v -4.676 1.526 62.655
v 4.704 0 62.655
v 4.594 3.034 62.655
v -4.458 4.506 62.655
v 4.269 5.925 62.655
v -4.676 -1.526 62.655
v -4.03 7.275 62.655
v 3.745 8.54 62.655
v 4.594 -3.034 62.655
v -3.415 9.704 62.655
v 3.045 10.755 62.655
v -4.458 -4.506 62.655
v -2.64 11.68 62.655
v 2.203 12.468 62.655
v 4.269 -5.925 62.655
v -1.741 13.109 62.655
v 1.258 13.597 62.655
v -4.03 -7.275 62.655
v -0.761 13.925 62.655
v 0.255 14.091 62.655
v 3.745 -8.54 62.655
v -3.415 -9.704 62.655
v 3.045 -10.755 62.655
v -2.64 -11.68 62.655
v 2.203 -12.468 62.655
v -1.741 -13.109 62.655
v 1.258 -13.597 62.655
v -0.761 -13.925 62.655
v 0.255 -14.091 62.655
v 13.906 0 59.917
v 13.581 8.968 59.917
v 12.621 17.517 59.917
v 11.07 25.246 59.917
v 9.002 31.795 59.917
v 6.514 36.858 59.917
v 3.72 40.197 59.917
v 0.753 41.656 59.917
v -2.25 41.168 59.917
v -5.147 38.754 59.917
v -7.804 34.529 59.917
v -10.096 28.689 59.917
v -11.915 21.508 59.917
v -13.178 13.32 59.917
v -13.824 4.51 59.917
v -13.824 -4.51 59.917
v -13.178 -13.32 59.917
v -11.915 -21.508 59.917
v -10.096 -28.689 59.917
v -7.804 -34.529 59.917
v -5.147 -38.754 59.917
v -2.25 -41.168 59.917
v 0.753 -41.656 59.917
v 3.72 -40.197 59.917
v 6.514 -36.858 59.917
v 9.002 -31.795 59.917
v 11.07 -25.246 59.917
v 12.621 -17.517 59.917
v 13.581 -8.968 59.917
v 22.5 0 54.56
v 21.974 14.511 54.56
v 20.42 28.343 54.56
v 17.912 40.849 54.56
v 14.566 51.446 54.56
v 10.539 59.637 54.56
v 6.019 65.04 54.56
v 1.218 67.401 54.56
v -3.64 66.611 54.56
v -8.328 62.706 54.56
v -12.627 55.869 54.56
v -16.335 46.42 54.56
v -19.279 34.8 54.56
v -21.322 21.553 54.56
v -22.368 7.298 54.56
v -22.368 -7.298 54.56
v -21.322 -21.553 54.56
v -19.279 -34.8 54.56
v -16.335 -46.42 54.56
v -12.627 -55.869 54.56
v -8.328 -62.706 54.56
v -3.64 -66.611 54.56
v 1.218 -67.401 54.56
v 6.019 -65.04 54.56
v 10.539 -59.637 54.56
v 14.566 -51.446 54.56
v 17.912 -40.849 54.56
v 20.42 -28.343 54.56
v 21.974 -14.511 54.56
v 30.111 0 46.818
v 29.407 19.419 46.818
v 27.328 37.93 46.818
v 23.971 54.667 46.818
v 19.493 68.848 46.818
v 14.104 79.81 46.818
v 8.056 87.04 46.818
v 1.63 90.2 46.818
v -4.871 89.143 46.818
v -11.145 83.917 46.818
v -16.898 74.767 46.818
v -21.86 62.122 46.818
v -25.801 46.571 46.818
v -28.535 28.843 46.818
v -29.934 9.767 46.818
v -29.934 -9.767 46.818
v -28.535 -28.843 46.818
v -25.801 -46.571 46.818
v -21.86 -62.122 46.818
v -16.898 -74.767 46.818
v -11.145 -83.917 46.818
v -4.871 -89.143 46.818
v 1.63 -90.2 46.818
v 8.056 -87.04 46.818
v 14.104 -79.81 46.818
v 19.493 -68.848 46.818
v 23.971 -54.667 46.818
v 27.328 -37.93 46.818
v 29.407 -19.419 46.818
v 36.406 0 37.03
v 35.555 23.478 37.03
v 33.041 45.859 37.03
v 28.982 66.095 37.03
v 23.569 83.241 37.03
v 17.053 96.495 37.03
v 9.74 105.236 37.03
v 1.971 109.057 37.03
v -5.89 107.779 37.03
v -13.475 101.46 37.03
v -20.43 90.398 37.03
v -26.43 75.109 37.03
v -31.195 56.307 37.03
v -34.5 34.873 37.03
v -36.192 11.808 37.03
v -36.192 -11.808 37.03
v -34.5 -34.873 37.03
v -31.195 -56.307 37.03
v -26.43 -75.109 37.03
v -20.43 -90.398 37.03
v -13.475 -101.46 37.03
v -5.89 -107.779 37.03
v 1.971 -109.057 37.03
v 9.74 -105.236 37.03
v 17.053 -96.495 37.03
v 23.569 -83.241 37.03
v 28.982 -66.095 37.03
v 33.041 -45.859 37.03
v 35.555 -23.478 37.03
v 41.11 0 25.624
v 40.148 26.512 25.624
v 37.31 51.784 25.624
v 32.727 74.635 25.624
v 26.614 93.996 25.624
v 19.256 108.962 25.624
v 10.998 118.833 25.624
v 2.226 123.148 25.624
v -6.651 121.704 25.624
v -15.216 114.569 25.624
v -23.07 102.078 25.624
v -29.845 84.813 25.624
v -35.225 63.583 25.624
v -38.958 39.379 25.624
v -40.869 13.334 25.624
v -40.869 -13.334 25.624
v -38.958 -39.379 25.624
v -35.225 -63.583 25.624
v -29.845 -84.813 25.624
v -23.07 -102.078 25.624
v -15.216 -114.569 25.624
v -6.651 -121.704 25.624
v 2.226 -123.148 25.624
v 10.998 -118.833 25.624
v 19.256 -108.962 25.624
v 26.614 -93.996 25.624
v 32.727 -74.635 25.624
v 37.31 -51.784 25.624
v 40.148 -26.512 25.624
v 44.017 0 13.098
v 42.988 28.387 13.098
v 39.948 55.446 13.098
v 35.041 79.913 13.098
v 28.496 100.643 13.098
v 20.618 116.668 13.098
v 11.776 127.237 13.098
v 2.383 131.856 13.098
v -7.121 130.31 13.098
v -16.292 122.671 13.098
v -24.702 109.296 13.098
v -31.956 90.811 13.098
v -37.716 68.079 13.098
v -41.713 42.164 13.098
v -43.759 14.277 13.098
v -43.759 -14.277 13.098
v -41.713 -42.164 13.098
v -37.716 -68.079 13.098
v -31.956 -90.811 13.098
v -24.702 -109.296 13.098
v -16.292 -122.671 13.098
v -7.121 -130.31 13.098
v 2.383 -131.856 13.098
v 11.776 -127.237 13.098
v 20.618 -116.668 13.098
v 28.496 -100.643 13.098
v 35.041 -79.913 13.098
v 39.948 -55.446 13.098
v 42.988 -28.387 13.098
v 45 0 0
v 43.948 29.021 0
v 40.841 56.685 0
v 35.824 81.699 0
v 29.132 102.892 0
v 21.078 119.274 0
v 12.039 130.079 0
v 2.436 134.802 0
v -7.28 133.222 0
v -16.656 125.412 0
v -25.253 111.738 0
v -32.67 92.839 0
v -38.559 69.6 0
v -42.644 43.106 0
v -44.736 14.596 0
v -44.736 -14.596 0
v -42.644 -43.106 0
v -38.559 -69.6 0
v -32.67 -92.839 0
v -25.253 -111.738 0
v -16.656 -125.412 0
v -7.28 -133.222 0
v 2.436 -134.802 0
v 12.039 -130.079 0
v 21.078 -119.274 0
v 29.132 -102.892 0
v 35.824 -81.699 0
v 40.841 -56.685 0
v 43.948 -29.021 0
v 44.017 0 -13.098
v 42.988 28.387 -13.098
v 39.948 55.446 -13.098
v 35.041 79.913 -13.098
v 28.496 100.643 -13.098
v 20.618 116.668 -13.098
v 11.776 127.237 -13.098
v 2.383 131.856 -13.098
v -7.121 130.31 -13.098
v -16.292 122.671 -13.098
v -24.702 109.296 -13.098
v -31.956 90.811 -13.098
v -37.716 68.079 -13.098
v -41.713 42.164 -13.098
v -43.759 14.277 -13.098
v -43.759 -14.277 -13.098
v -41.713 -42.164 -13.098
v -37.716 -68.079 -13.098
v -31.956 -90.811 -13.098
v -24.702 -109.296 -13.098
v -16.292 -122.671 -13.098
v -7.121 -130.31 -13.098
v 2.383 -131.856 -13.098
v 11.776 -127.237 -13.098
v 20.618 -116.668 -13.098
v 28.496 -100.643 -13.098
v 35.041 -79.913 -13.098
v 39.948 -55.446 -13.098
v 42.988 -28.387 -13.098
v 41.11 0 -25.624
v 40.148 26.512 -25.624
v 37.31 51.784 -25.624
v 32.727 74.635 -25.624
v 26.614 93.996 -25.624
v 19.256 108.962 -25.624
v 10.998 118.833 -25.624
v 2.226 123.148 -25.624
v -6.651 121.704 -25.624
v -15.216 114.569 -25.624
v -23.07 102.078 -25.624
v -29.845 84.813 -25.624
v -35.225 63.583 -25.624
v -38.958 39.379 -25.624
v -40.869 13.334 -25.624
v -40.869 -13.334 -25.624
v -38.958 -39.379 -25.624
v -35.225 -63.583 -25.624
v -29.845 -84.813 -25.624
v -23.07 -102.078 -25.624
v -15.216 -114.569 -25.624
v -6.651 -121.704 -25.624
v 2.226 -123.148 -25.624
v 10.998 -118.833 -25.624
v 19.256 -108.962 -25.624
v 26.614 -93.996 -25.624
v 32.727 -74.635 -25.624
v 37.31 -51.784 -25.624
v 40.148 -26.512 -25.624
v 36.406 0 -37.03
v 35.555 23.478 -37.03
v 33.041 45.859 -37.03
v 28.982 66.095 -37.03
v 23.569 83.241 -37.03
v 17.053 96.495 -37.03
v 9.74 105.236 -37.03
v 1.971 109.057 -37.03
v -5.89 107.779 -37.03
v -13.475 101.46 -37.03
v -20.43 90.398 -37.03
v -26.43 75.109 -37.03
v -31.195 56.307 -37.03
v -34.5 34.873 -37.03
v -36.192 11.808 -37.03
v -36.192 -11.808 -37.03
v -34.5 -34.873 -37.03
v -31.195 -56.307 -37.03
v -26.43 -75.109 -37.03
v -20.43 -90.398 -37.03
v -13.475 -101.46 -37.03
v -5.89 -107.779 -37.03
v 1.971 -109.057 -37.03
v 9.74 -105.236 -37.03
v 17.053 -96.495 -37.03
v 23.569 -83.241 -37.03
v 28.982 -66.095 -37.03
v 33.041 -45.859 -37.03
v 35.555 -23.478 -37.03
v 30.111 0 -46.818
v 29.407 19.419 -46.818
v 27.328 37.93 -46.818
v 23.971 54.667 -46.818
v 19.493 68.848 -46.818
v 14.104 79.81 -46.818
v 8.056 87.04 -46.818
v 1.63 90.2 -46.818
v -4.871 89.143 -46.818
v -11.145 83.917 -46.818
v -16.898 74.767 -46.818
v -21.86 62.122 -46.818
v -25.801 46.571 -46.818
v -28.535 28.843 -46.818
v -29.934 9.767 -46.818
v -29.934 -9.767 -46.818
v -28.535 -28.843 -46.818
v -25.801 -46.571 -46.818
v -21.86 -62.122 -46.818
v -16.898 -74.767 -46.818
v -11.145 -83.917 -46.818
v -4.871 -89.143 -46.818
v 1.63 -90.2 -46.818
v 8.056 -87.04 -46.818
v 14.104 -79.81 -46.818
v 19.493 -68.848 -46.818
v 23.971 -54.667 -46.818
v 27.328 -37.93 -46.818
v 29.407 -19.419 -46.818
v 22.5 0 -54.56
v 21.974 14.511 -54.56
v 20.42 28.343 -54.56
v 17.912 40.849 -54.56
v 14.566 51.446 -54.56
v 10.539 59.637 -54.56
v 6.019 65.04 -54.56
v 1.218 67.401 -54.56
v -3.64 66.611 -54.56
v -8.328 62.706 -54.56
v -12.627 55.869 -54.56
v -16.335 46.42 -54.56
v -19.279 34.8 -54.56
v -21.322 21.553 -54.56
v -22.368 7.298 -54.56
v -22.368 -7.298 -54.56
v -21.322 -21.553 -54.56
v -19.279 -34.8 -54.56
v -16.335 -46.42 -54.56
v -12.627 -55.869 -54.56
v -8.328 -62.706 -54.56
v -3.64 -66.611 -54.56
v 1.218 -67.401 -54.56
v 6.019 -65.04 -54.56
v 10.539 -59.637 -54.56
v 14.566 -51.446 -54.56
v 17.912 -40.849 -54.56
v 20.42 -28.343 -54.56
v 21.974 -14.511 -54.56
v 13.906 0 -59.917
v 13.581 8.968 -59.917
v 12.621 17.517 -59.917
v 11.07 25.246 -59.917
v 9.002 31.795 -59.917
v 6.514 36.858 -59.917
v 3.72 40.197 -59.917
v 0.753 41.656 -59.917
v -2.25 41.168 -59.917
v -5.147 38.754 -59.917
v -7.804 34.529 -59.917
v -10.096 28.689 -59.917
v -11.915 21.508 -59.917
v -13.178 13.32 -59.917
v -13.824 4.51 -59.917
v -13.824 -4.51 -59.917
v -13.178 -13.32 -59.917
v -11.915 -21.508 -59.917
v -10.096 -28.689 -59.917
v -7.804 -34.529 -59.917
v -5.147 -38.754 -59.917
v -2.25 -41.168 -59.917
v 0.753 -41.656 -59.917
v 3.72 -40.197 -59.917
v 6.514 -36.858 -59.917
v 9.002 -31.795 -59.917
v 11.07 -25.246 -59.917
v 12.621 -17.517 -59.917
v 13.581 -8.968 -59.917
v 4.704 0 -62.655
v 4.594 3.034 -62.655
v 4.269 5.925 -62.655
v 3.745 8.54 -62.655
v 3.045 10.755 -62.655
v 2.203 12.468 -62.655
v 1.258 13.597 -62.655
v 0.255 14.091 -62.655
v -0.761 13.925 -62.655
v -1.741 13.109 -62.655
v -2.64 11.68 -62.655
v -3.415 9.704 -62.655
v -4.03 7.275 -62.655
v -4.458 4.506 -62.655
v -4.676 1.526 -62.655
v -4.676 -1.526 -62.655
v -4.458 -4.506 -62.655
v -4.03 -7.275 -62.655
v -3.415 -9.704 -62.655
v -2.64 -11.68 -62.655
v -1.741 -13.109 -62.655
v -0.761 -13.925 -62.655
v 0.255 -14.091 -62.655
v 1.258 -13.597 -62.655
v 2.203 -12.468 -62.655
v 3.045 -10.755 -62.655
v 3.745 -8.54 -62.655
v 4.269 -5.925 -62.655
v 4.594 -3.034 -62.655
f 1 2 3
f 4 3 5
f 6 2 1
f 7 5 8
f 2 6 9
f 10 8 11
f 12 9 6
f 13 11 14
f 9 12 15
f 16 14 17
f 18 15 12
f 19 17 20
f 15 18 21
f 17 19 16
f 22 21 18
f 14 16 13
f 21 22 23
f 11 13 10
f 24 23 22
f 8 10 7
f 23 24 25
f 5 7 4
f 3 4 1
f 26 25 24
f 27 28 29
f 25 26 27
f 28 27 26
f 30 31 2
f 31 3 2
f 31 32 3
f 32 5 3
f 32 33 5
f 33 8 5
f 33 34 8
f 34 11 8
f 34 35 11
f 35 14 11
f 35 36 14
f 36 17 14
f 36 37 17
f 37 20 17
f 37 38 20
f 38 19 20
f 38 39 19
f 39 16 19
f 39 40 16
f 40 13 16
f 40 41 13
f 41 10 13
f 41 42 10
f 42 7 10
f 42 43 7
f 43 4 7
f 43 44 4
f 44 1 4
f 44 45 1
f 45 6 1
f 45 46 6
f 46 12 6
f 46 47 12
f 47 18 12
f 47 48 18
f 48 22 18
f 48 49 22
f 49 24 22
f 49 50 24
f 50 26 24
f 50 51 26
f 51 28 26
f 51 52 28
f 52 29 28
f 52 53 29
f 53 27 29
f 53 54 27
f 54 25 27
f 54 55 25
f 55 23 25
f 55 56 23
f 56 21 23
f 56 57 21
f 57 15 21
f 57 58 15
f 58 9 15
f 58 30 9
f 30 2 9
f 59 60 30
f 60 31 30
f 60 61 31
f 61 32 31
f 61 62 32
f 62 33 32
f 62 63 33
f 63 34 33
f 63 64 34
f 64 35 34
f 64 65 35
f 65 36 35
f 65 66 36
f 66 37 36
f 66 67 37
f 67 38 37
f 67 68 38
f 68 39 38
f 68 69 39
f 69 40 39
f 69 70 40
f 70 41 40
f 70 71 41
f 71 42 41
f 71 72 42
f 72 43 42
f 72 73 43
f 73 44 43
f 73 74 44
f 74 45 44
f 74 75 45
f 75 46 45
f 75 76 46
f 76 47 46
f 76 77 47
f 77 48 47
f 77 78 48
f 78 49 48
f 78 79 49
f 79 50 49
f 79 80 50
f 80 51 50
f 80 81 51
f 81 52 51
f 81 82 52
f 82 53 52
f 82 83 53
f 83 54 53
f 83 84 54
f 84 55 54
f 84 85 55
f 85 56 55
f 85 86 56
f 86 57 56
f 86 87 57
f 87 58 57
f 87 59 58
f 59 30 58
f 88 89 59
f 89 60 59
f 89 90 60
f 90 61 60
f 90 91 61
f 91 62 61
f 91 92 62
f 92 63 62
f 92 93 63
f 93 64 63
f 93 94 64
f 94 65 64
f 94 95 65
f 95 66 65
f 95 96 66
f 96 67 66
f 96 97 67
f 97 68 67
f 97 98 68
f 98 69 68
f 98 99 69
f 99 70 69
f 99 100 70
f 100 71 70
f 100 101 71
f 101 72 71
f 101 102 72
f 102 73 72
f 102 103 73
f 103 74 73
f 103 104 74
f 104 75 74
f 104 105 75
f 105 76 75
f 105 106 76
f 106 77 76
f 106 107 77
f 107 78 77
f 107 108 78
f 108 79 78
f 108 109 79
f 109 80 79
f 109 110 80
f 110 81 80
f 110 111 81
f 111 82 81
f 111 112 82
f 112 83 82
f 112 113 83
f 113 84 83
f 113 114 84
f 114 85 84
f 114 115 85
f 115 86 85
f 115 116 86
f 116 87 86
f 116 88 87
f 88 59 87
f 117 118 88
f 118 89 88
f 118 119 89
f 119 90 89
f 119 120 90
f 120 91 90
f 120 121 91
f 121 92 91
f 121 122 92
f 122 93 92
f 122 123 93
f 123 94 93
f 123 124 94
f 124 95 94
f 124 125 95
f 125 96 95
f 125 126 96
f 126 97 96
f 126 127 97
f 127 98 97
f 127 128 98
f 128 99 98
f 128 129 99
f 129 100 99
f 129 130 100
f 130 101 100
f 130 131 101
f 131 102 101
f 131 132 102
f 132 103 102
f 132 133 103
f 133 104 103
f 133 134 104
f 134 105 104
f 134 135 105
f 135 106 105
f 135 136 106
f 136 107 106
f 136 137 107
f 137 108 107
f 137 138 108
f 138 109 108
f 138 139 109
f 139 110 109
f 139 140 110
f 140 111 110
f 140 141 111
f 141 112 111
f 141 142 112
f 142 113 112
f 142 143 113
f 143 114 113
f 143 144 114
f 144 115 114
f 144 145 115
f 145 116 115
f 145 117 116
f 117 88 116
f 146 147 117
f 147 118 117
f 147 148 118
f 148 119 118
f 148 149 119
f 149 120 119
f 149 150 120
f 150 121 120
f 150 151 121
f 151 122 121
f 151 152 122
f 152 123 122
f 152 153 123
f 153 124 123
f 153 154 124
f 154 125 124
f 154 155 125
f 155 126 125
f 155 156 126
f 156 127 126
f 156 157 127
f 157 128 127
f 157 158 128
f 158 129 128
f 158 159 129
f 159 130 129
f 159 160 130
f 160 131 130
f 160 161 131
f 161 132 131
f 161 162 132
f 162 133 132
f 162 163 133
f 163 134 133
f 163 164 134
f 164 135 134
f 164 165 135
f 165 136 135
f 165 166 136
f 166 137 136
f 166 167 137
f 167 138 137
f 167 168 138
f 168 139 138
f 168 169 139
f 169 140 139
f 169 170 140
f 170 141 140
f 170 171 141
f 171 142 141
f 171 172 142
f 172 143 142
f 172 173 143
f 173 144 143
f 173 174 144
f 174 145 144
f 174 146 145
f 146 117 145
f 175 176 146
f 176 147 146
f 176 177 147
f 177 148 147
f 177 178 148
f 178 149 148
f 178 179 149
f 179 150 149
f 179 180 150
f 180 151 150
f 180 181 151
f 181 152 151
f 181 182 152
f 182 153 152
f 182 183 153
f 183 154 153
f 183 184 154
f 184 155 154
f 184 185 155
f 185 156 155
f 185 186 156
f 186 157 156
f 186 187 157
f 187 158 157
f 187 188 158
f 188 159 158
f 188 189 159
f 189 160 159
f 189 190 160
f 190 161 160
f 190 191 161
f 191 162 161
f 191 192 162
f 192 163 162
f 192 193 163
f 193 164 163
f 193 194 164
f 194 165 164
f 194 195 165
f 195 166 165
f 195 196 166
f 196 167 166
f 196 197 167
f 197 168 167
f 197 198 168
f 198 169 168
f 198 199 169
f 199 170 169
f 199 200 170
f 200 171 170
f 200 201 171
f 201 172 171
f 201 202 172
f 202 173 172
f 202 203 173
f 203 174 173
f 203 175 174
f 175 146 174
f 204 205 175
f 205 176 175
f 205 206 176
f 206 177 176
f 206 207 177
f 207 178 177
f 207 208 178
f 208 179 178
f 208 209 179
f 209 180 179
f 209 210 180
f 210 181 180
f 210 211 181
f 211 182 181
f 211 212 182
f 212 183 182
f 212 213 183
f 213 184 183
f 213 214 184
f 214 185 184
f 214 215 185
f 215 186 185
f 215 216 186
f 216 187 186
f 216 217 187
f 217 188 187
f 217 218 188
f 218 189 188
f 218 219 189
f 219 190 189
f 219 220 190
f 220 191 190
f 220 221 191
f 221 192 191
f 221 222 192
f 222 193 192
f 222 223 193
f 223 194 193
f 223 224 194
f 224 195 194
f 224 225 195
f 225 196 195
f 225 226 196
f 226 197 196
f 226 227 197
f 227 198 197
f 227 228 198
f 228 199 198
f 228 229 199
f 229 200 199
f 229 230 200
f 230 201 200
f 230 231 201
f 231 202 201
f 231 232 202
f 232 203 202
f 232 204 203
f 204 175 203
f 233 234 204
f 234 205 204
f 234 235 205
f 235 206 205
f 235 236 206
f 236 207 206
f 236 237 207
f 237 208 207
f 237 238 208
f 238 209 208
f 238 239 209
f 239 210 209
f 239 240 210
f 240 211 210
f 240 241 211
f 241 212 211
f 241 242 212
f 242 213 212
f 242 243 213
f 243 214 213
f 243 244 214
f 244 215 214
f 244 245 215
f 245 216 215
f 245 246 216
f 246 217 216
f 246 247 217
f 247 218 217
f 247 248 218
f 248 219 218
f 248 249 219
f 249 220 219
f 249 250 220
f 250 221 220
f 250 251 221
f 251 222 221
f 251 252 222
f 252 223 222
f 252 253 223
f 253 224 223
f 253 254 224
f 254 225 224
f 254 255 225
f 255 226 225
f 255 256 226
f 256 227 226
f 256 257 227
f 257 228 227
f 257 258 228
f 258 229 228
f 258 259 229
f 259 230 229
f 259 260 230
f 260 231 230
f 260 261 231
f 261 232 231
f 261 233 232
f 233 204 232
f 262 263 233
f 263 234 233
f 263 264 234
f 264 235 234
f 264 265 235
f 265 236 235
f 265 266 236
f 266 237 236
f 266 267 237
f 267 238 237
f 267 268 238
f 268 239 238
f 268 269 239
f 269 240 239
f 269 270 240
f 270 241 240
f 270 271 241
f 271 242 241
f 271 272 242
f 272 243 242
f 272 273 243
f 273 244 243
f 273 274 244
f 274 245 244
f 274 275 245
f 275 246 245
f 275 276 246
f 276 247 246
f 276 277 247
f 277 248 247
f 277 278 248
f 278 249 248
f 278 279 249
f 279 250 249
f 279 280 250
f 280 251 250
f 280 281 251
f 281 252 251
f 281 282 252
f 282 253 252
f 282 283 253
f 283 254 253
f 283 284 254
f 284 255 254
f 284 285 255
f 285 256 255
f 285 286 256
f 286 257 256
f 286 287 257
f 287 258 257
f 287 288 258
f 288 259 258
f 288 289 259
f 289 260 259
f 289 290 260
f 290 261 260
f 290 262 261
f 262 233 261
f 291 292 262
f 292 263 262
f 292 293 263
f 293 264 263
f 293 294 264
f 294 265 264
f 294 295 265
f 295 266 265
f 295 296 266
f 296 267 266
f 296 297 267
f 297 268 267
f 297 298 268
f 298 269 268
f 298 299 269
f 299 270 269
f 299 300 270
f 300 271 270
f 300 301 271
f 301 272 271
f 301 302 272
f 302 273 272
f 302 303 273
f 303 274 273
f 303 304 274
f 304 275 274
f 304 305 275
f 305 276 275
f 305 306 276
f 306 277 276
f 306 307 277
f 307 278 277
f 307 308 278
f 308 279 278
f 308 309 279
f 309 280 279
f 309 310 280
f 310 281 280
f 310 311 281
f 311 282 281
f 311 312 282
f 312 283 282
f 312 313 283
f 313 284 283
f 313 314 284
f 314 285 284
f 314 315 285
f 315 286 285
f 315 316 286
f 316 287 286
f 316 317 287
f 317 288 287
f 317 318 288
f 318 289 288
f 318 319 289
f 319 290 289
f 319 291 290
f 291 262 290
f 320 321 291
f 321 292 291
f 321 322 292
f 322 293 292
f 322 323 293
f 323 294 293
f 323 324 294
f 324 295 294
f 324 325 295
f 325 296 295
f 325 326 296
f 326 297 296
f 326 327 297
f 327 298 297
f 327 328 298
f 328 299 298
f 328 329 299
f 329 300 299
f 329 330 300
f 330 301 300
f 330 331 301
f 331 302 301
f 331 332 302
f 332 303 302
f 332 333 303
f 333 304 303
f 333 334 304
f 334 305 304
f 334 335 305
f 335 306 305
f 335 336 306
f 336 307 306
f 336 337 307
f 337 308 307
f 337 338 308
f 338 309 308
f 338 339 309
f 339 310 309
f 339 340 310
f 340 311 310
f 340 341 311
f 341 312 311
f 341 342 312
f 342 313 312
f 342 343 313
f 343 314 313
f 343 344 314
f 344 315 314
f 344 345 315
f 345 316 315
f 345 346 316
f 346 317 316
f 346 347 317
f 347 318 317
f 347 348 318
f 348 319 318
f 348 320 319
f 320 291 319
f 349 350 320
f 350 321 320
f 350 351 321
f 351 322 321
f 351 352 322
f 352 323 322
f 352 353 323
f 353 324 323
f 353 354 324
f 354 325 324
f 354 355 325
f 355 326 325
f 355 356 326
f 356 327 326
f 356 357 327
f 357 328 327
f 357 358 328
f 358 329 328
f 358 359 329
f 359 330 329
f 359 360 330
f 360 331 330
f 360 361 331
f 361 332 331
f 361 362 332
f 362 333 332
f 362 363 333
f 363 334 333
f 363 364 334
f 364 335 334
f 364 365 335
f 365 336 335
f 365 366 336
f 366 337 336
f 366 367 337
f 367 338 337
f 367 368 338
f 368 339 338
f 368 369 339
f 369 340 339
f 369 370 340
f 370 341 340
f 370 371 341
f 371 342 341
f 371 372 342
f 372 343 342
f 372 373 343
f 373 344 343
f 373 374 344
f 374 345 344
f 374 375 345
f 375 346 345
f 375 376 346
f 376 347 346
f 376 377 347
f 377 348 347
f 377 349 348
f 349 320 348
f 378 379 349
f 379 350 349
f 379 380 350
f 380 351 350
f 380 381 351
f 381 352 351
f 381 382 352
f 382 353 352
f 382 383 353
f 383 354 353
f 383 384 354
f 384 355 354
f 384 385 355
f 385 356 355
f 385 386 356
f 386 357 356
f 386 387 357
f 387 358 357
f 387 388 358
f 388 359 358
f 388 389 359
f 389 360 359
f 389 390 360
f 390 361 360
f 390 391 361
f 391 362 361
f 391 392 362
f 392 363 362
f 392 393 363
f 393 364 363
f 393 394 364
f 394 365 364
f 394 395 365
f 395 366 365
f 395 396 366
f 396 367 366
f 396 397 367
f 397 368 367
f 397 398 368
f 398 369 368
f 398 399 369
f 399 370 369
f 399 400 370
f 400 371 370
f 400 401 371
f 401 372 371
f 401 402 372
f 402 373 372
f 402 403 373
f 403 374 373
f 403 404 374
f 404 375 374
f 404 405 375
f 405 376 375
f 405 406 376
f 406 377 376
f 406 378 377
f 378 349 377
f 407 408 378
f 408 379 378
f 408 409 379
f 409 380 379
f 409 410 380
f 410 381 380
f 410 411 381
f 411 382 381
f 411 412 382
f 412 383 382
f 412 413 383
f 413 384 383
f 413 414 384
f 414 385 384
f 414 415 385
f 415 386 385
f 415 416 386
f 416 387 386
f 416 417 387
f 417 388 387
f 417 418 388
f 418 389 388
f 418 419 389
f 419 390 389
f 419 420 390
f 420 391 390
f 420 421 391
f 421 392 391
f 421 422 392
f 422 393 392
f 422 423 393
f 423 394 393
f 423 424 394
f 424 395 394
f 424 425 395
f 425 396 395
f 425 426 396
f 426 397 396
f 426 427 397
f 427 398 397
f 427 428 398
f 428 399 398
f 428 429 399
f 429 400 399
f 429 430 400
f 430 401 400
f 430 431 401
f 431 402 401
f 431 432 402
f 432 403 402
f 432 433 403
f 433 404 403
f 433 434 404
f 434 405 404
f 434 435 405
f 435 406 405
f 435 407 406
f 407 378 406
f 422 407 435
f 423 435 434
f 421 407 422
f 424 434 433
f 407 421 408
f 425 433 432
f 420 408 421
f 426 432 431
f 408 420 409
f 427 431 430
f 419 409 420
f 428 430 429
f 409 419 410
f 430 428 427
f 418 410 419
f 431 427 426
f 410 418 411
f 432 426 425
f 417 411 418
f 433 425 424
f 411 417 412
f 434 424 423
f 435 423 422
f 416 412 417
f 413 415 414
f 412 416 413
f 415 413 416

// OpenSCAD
// Generated by SolidPython 1.0.1 on 2020-07-29 00:46:46


scale(v = [5, 15, 7]) {
	sphere(r = 9);
}
/***********************************************
*********      SolidPython code:      **********
************************************************
 
# import packages: SolidPython
from solid import *
from solid.utils import *
from itertools import chain, combinations, permutations


class Resize:

    def __init__(self, scad_file):
        self.scad_file = scad_file
        #self.scad_file = import_scad(scad_file)
        # cone/cylinder param:
        self.r1 = 0
        self.r2 = 0
        self.h = 0
        # rectangular prism param:
        self.w = 0
        self.l = 0
        # ellipse param:
        self.r = 0

    # import OpenScad code (file name corresponds to shape)


    # classify shape + parameters
    def assign(self, param1, param2, param3):
        if self.scad_file == 'cone.scad':
            self.r1 = param1
            self.r2 = param2
            self.h = param3
        elif self.scad_file == 'cylinder.scad':
            self.r1 = param1
            self.r2 = param2
            self.h = param3
        elif self.scad_file == 'rectangularPrism.scad':
            self.h = param1
            self.l = param2
            self.w = param3
        else:
            self.r = param1
            self.h = param2

    # resize parameters
    def iterate(self):
        x = range(3, 20, 2)
        i = 1
        if self.scad_file == 'cone.scad':
            tempList = list(permutations(x, 2))
            for temp in tempList:
                param1 = temp[0]
                param2 = temp[1]
                filepath = 'produced_scad_files/' + 'cone' + str(param1) + '_' + str(param2) + '_' + '.scad'
                scad_render_to_file(cylinder(h=param1, r1=param2, r2=0), filepath)

        elif self.scad_file == 'cylinder.scad':
            tempList = list(permutations(x, 3))
            for temp in tempList:
                param1 = temp[0]
                param2 = temp[1]
                filepath = 'produced_scad_files/' + 'cylinder' + str(param1) + '_' + str(param2) + '_' + '.scad'
                scad_render_to_file(cylinder(h=param1, r1=param2, r2=param2), filepath)

        elif self.scad_file == 'rectangularPrism.scad':
            tempList = list(permutations(x, 3))
            for temp in tempList:
                param1 = temp[0]
                param2 = temp[1]
                param3 = temp[2]
                filepath = 'produced_scad_files/' + 'rectangularPrism' + str(param1) + '_' + str(param2) + '_' + str(
                    param3) + '.scad'
                scad_render_to_file(cube(size=(param1, param2, param3)), filepath)

        elif self.scad_file == 'ellipse.scad':
            tempList = list(permutations(x, 4))
            for temp in tempList:
                param1 = temp[0]
                param2 = temp[1]
                param3 = temp[2]
                param4 = temp[3]
                filepath = 'produced_scad_files/' + 'ellipse' + str(param1) + '_' + str(param2) + '_' + str(param3) + '_' + str(param4) + '.scad'
                scad_render_to_file(scale([param1, param2, param3])(sphere(r=param4)), filepath)

    def render_to_scadfile(self):
        scad_render_to_file(scad, 'example.scad') 
 
************************************************/
